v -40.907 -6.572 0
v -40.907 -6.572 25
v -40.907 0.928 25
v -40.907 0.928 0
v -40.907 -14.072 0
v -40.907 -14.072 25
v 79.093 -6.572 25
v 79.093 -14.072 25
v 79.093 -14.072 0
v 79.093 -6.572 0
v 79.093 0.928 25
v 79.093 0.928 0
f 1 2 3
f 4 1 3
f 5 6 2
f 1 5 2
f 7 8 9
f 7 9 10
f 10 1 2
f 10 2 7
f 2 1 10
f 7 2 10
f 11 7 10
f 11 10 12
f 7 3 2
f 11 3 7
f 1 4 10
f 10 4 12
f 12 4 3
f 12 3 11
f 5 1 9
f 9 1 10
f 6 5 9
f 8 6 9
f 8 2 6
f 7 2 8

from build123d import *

# Parameters (mm, degrees)
F1_DEPTH = 25
F0_W     = 120
F0_H     = 7.5
F2_DEPTH = 25


with BuildPart() as f1:
    # F0 (on Top) → F1 (new body)
    with BuildSketch(Plane.XY):
        with BuildLine():
            Line((-55.5115031336, -1.2673012726), (-60.5115031336, -1.2673012726))
            Line((-60.5115031336, -1.2673012726), (-60.5115031336, -6.2673012726))
            ThreePointArc((-60.5115031336, -6.2673012726), (-59.0470370395, -2.7317673667), (-55.5115031336, -1.2673012726))
        make_face()
    extrude(amount=F1_DEPTH)


with BuildPart() as f1b:
    # F0 (on Top) → F1, piece 2 (new body)
    with BuildSketch(Plane.XY):
        with BuildLine():
            Line((-50.5115031336, -1.2673012726), (-55.5115031336, -1.2673012726))
            ThreePointArc((-55.5115031336, -1.2673012726), (-51.9759692277, -2.7317673667), (-50.5115031336, -6.2673012726))
            Line((-50.5115031336, -6.2673012726), (-50.5115031336, -1.2673012726))
        make_face()
    extrude(amount=F1_DEPTH)


with BuildPart() as f1c:
    # F0 (on Top) → F1, piece 3 (new body)
    with BuildSketch(Plane.XY):
        with BuildLine():
            ThreePointArc((-55.5115031336, -11.2673012726), (-59.0470370395, -9.8028351785), (-60.5115031336, -6.2673012726))
            Line((-60.5115031336, -6.2673012726), (-60.5115031336, -11.2673012726))
            Line((-60.5115031336, -11.2673012726), (-55.5115031336, -11.2673012726))
        make_face()
    extrude(amount=F1_DEPTH)


with BuildPart() as f1d:
    # F0 (on Top) → F1, piece 4 (new body)
    with BuildSketch(Plane.XY):
        with BuildLine():
            Line((-50.5115031336, -11.2673012726), (-50.5115031336, -6.2673012726))
            ThreePointArc((-50.5115031336, -6.2673012726), (-51.9759692277, -9.8028351785), (-55.5115031336, -11.2673012726))
            Line((-55.5115031336, -11.2673012726), (-50.5115031336, -11.2673012726))
        make_face()
    extrude(amount=F1_DEPTH)


with BuildPart() as f1e:
    # F0 (on Top) → F1, piece 5 (new body)
    with BuildSketch(Plane.XY):
        with Locations((19.0931870043, -10.3215911984)):
            Rectangle(F0_W, F0_H)
    extrude(amount=F1_DEPTH)


with BuildPart() as f2:
    # F0 (on Top) → F2 (new body)
    with BuildSketch(Plane.XY):
        with BuildLine():
            ThreePointArc((-50.5115031336, -6.2673012726), (-51.9759692277, -2.7317673667), (-55.5115031336, -1.2673012726))
            ThreePointArc((-55.5115031336, -1.2673012726), (-59.0470370395, -2.7317673667), (-60.5115031336, -6.2673012726))
            ThreePointArc((-60.5115031336, -6.2673012726), (-59.0470370395, -9.8028351785), (-55.5115031336, -11.2673012726))
            ThreePointArc((-55.5115031336, -11.2673012726), (-51.9759692277, -9.8028351785), (-50.5115031336, -6.2673012726))
        make_face()
    extrude(amount=F2_DEPTH)


with BuildPart() as f2b:
    # F0 (on Top) → F2, piece 2 (new body)
    with BuildSketch(Plane.XY):
        with Locations((19.0931870043, -2.8215911984)):
            Rectangle(F0_W, F0_H)
    extrude(amount=F2_DEPTH)


solid = Compound([f1e.part, f2b.part])
